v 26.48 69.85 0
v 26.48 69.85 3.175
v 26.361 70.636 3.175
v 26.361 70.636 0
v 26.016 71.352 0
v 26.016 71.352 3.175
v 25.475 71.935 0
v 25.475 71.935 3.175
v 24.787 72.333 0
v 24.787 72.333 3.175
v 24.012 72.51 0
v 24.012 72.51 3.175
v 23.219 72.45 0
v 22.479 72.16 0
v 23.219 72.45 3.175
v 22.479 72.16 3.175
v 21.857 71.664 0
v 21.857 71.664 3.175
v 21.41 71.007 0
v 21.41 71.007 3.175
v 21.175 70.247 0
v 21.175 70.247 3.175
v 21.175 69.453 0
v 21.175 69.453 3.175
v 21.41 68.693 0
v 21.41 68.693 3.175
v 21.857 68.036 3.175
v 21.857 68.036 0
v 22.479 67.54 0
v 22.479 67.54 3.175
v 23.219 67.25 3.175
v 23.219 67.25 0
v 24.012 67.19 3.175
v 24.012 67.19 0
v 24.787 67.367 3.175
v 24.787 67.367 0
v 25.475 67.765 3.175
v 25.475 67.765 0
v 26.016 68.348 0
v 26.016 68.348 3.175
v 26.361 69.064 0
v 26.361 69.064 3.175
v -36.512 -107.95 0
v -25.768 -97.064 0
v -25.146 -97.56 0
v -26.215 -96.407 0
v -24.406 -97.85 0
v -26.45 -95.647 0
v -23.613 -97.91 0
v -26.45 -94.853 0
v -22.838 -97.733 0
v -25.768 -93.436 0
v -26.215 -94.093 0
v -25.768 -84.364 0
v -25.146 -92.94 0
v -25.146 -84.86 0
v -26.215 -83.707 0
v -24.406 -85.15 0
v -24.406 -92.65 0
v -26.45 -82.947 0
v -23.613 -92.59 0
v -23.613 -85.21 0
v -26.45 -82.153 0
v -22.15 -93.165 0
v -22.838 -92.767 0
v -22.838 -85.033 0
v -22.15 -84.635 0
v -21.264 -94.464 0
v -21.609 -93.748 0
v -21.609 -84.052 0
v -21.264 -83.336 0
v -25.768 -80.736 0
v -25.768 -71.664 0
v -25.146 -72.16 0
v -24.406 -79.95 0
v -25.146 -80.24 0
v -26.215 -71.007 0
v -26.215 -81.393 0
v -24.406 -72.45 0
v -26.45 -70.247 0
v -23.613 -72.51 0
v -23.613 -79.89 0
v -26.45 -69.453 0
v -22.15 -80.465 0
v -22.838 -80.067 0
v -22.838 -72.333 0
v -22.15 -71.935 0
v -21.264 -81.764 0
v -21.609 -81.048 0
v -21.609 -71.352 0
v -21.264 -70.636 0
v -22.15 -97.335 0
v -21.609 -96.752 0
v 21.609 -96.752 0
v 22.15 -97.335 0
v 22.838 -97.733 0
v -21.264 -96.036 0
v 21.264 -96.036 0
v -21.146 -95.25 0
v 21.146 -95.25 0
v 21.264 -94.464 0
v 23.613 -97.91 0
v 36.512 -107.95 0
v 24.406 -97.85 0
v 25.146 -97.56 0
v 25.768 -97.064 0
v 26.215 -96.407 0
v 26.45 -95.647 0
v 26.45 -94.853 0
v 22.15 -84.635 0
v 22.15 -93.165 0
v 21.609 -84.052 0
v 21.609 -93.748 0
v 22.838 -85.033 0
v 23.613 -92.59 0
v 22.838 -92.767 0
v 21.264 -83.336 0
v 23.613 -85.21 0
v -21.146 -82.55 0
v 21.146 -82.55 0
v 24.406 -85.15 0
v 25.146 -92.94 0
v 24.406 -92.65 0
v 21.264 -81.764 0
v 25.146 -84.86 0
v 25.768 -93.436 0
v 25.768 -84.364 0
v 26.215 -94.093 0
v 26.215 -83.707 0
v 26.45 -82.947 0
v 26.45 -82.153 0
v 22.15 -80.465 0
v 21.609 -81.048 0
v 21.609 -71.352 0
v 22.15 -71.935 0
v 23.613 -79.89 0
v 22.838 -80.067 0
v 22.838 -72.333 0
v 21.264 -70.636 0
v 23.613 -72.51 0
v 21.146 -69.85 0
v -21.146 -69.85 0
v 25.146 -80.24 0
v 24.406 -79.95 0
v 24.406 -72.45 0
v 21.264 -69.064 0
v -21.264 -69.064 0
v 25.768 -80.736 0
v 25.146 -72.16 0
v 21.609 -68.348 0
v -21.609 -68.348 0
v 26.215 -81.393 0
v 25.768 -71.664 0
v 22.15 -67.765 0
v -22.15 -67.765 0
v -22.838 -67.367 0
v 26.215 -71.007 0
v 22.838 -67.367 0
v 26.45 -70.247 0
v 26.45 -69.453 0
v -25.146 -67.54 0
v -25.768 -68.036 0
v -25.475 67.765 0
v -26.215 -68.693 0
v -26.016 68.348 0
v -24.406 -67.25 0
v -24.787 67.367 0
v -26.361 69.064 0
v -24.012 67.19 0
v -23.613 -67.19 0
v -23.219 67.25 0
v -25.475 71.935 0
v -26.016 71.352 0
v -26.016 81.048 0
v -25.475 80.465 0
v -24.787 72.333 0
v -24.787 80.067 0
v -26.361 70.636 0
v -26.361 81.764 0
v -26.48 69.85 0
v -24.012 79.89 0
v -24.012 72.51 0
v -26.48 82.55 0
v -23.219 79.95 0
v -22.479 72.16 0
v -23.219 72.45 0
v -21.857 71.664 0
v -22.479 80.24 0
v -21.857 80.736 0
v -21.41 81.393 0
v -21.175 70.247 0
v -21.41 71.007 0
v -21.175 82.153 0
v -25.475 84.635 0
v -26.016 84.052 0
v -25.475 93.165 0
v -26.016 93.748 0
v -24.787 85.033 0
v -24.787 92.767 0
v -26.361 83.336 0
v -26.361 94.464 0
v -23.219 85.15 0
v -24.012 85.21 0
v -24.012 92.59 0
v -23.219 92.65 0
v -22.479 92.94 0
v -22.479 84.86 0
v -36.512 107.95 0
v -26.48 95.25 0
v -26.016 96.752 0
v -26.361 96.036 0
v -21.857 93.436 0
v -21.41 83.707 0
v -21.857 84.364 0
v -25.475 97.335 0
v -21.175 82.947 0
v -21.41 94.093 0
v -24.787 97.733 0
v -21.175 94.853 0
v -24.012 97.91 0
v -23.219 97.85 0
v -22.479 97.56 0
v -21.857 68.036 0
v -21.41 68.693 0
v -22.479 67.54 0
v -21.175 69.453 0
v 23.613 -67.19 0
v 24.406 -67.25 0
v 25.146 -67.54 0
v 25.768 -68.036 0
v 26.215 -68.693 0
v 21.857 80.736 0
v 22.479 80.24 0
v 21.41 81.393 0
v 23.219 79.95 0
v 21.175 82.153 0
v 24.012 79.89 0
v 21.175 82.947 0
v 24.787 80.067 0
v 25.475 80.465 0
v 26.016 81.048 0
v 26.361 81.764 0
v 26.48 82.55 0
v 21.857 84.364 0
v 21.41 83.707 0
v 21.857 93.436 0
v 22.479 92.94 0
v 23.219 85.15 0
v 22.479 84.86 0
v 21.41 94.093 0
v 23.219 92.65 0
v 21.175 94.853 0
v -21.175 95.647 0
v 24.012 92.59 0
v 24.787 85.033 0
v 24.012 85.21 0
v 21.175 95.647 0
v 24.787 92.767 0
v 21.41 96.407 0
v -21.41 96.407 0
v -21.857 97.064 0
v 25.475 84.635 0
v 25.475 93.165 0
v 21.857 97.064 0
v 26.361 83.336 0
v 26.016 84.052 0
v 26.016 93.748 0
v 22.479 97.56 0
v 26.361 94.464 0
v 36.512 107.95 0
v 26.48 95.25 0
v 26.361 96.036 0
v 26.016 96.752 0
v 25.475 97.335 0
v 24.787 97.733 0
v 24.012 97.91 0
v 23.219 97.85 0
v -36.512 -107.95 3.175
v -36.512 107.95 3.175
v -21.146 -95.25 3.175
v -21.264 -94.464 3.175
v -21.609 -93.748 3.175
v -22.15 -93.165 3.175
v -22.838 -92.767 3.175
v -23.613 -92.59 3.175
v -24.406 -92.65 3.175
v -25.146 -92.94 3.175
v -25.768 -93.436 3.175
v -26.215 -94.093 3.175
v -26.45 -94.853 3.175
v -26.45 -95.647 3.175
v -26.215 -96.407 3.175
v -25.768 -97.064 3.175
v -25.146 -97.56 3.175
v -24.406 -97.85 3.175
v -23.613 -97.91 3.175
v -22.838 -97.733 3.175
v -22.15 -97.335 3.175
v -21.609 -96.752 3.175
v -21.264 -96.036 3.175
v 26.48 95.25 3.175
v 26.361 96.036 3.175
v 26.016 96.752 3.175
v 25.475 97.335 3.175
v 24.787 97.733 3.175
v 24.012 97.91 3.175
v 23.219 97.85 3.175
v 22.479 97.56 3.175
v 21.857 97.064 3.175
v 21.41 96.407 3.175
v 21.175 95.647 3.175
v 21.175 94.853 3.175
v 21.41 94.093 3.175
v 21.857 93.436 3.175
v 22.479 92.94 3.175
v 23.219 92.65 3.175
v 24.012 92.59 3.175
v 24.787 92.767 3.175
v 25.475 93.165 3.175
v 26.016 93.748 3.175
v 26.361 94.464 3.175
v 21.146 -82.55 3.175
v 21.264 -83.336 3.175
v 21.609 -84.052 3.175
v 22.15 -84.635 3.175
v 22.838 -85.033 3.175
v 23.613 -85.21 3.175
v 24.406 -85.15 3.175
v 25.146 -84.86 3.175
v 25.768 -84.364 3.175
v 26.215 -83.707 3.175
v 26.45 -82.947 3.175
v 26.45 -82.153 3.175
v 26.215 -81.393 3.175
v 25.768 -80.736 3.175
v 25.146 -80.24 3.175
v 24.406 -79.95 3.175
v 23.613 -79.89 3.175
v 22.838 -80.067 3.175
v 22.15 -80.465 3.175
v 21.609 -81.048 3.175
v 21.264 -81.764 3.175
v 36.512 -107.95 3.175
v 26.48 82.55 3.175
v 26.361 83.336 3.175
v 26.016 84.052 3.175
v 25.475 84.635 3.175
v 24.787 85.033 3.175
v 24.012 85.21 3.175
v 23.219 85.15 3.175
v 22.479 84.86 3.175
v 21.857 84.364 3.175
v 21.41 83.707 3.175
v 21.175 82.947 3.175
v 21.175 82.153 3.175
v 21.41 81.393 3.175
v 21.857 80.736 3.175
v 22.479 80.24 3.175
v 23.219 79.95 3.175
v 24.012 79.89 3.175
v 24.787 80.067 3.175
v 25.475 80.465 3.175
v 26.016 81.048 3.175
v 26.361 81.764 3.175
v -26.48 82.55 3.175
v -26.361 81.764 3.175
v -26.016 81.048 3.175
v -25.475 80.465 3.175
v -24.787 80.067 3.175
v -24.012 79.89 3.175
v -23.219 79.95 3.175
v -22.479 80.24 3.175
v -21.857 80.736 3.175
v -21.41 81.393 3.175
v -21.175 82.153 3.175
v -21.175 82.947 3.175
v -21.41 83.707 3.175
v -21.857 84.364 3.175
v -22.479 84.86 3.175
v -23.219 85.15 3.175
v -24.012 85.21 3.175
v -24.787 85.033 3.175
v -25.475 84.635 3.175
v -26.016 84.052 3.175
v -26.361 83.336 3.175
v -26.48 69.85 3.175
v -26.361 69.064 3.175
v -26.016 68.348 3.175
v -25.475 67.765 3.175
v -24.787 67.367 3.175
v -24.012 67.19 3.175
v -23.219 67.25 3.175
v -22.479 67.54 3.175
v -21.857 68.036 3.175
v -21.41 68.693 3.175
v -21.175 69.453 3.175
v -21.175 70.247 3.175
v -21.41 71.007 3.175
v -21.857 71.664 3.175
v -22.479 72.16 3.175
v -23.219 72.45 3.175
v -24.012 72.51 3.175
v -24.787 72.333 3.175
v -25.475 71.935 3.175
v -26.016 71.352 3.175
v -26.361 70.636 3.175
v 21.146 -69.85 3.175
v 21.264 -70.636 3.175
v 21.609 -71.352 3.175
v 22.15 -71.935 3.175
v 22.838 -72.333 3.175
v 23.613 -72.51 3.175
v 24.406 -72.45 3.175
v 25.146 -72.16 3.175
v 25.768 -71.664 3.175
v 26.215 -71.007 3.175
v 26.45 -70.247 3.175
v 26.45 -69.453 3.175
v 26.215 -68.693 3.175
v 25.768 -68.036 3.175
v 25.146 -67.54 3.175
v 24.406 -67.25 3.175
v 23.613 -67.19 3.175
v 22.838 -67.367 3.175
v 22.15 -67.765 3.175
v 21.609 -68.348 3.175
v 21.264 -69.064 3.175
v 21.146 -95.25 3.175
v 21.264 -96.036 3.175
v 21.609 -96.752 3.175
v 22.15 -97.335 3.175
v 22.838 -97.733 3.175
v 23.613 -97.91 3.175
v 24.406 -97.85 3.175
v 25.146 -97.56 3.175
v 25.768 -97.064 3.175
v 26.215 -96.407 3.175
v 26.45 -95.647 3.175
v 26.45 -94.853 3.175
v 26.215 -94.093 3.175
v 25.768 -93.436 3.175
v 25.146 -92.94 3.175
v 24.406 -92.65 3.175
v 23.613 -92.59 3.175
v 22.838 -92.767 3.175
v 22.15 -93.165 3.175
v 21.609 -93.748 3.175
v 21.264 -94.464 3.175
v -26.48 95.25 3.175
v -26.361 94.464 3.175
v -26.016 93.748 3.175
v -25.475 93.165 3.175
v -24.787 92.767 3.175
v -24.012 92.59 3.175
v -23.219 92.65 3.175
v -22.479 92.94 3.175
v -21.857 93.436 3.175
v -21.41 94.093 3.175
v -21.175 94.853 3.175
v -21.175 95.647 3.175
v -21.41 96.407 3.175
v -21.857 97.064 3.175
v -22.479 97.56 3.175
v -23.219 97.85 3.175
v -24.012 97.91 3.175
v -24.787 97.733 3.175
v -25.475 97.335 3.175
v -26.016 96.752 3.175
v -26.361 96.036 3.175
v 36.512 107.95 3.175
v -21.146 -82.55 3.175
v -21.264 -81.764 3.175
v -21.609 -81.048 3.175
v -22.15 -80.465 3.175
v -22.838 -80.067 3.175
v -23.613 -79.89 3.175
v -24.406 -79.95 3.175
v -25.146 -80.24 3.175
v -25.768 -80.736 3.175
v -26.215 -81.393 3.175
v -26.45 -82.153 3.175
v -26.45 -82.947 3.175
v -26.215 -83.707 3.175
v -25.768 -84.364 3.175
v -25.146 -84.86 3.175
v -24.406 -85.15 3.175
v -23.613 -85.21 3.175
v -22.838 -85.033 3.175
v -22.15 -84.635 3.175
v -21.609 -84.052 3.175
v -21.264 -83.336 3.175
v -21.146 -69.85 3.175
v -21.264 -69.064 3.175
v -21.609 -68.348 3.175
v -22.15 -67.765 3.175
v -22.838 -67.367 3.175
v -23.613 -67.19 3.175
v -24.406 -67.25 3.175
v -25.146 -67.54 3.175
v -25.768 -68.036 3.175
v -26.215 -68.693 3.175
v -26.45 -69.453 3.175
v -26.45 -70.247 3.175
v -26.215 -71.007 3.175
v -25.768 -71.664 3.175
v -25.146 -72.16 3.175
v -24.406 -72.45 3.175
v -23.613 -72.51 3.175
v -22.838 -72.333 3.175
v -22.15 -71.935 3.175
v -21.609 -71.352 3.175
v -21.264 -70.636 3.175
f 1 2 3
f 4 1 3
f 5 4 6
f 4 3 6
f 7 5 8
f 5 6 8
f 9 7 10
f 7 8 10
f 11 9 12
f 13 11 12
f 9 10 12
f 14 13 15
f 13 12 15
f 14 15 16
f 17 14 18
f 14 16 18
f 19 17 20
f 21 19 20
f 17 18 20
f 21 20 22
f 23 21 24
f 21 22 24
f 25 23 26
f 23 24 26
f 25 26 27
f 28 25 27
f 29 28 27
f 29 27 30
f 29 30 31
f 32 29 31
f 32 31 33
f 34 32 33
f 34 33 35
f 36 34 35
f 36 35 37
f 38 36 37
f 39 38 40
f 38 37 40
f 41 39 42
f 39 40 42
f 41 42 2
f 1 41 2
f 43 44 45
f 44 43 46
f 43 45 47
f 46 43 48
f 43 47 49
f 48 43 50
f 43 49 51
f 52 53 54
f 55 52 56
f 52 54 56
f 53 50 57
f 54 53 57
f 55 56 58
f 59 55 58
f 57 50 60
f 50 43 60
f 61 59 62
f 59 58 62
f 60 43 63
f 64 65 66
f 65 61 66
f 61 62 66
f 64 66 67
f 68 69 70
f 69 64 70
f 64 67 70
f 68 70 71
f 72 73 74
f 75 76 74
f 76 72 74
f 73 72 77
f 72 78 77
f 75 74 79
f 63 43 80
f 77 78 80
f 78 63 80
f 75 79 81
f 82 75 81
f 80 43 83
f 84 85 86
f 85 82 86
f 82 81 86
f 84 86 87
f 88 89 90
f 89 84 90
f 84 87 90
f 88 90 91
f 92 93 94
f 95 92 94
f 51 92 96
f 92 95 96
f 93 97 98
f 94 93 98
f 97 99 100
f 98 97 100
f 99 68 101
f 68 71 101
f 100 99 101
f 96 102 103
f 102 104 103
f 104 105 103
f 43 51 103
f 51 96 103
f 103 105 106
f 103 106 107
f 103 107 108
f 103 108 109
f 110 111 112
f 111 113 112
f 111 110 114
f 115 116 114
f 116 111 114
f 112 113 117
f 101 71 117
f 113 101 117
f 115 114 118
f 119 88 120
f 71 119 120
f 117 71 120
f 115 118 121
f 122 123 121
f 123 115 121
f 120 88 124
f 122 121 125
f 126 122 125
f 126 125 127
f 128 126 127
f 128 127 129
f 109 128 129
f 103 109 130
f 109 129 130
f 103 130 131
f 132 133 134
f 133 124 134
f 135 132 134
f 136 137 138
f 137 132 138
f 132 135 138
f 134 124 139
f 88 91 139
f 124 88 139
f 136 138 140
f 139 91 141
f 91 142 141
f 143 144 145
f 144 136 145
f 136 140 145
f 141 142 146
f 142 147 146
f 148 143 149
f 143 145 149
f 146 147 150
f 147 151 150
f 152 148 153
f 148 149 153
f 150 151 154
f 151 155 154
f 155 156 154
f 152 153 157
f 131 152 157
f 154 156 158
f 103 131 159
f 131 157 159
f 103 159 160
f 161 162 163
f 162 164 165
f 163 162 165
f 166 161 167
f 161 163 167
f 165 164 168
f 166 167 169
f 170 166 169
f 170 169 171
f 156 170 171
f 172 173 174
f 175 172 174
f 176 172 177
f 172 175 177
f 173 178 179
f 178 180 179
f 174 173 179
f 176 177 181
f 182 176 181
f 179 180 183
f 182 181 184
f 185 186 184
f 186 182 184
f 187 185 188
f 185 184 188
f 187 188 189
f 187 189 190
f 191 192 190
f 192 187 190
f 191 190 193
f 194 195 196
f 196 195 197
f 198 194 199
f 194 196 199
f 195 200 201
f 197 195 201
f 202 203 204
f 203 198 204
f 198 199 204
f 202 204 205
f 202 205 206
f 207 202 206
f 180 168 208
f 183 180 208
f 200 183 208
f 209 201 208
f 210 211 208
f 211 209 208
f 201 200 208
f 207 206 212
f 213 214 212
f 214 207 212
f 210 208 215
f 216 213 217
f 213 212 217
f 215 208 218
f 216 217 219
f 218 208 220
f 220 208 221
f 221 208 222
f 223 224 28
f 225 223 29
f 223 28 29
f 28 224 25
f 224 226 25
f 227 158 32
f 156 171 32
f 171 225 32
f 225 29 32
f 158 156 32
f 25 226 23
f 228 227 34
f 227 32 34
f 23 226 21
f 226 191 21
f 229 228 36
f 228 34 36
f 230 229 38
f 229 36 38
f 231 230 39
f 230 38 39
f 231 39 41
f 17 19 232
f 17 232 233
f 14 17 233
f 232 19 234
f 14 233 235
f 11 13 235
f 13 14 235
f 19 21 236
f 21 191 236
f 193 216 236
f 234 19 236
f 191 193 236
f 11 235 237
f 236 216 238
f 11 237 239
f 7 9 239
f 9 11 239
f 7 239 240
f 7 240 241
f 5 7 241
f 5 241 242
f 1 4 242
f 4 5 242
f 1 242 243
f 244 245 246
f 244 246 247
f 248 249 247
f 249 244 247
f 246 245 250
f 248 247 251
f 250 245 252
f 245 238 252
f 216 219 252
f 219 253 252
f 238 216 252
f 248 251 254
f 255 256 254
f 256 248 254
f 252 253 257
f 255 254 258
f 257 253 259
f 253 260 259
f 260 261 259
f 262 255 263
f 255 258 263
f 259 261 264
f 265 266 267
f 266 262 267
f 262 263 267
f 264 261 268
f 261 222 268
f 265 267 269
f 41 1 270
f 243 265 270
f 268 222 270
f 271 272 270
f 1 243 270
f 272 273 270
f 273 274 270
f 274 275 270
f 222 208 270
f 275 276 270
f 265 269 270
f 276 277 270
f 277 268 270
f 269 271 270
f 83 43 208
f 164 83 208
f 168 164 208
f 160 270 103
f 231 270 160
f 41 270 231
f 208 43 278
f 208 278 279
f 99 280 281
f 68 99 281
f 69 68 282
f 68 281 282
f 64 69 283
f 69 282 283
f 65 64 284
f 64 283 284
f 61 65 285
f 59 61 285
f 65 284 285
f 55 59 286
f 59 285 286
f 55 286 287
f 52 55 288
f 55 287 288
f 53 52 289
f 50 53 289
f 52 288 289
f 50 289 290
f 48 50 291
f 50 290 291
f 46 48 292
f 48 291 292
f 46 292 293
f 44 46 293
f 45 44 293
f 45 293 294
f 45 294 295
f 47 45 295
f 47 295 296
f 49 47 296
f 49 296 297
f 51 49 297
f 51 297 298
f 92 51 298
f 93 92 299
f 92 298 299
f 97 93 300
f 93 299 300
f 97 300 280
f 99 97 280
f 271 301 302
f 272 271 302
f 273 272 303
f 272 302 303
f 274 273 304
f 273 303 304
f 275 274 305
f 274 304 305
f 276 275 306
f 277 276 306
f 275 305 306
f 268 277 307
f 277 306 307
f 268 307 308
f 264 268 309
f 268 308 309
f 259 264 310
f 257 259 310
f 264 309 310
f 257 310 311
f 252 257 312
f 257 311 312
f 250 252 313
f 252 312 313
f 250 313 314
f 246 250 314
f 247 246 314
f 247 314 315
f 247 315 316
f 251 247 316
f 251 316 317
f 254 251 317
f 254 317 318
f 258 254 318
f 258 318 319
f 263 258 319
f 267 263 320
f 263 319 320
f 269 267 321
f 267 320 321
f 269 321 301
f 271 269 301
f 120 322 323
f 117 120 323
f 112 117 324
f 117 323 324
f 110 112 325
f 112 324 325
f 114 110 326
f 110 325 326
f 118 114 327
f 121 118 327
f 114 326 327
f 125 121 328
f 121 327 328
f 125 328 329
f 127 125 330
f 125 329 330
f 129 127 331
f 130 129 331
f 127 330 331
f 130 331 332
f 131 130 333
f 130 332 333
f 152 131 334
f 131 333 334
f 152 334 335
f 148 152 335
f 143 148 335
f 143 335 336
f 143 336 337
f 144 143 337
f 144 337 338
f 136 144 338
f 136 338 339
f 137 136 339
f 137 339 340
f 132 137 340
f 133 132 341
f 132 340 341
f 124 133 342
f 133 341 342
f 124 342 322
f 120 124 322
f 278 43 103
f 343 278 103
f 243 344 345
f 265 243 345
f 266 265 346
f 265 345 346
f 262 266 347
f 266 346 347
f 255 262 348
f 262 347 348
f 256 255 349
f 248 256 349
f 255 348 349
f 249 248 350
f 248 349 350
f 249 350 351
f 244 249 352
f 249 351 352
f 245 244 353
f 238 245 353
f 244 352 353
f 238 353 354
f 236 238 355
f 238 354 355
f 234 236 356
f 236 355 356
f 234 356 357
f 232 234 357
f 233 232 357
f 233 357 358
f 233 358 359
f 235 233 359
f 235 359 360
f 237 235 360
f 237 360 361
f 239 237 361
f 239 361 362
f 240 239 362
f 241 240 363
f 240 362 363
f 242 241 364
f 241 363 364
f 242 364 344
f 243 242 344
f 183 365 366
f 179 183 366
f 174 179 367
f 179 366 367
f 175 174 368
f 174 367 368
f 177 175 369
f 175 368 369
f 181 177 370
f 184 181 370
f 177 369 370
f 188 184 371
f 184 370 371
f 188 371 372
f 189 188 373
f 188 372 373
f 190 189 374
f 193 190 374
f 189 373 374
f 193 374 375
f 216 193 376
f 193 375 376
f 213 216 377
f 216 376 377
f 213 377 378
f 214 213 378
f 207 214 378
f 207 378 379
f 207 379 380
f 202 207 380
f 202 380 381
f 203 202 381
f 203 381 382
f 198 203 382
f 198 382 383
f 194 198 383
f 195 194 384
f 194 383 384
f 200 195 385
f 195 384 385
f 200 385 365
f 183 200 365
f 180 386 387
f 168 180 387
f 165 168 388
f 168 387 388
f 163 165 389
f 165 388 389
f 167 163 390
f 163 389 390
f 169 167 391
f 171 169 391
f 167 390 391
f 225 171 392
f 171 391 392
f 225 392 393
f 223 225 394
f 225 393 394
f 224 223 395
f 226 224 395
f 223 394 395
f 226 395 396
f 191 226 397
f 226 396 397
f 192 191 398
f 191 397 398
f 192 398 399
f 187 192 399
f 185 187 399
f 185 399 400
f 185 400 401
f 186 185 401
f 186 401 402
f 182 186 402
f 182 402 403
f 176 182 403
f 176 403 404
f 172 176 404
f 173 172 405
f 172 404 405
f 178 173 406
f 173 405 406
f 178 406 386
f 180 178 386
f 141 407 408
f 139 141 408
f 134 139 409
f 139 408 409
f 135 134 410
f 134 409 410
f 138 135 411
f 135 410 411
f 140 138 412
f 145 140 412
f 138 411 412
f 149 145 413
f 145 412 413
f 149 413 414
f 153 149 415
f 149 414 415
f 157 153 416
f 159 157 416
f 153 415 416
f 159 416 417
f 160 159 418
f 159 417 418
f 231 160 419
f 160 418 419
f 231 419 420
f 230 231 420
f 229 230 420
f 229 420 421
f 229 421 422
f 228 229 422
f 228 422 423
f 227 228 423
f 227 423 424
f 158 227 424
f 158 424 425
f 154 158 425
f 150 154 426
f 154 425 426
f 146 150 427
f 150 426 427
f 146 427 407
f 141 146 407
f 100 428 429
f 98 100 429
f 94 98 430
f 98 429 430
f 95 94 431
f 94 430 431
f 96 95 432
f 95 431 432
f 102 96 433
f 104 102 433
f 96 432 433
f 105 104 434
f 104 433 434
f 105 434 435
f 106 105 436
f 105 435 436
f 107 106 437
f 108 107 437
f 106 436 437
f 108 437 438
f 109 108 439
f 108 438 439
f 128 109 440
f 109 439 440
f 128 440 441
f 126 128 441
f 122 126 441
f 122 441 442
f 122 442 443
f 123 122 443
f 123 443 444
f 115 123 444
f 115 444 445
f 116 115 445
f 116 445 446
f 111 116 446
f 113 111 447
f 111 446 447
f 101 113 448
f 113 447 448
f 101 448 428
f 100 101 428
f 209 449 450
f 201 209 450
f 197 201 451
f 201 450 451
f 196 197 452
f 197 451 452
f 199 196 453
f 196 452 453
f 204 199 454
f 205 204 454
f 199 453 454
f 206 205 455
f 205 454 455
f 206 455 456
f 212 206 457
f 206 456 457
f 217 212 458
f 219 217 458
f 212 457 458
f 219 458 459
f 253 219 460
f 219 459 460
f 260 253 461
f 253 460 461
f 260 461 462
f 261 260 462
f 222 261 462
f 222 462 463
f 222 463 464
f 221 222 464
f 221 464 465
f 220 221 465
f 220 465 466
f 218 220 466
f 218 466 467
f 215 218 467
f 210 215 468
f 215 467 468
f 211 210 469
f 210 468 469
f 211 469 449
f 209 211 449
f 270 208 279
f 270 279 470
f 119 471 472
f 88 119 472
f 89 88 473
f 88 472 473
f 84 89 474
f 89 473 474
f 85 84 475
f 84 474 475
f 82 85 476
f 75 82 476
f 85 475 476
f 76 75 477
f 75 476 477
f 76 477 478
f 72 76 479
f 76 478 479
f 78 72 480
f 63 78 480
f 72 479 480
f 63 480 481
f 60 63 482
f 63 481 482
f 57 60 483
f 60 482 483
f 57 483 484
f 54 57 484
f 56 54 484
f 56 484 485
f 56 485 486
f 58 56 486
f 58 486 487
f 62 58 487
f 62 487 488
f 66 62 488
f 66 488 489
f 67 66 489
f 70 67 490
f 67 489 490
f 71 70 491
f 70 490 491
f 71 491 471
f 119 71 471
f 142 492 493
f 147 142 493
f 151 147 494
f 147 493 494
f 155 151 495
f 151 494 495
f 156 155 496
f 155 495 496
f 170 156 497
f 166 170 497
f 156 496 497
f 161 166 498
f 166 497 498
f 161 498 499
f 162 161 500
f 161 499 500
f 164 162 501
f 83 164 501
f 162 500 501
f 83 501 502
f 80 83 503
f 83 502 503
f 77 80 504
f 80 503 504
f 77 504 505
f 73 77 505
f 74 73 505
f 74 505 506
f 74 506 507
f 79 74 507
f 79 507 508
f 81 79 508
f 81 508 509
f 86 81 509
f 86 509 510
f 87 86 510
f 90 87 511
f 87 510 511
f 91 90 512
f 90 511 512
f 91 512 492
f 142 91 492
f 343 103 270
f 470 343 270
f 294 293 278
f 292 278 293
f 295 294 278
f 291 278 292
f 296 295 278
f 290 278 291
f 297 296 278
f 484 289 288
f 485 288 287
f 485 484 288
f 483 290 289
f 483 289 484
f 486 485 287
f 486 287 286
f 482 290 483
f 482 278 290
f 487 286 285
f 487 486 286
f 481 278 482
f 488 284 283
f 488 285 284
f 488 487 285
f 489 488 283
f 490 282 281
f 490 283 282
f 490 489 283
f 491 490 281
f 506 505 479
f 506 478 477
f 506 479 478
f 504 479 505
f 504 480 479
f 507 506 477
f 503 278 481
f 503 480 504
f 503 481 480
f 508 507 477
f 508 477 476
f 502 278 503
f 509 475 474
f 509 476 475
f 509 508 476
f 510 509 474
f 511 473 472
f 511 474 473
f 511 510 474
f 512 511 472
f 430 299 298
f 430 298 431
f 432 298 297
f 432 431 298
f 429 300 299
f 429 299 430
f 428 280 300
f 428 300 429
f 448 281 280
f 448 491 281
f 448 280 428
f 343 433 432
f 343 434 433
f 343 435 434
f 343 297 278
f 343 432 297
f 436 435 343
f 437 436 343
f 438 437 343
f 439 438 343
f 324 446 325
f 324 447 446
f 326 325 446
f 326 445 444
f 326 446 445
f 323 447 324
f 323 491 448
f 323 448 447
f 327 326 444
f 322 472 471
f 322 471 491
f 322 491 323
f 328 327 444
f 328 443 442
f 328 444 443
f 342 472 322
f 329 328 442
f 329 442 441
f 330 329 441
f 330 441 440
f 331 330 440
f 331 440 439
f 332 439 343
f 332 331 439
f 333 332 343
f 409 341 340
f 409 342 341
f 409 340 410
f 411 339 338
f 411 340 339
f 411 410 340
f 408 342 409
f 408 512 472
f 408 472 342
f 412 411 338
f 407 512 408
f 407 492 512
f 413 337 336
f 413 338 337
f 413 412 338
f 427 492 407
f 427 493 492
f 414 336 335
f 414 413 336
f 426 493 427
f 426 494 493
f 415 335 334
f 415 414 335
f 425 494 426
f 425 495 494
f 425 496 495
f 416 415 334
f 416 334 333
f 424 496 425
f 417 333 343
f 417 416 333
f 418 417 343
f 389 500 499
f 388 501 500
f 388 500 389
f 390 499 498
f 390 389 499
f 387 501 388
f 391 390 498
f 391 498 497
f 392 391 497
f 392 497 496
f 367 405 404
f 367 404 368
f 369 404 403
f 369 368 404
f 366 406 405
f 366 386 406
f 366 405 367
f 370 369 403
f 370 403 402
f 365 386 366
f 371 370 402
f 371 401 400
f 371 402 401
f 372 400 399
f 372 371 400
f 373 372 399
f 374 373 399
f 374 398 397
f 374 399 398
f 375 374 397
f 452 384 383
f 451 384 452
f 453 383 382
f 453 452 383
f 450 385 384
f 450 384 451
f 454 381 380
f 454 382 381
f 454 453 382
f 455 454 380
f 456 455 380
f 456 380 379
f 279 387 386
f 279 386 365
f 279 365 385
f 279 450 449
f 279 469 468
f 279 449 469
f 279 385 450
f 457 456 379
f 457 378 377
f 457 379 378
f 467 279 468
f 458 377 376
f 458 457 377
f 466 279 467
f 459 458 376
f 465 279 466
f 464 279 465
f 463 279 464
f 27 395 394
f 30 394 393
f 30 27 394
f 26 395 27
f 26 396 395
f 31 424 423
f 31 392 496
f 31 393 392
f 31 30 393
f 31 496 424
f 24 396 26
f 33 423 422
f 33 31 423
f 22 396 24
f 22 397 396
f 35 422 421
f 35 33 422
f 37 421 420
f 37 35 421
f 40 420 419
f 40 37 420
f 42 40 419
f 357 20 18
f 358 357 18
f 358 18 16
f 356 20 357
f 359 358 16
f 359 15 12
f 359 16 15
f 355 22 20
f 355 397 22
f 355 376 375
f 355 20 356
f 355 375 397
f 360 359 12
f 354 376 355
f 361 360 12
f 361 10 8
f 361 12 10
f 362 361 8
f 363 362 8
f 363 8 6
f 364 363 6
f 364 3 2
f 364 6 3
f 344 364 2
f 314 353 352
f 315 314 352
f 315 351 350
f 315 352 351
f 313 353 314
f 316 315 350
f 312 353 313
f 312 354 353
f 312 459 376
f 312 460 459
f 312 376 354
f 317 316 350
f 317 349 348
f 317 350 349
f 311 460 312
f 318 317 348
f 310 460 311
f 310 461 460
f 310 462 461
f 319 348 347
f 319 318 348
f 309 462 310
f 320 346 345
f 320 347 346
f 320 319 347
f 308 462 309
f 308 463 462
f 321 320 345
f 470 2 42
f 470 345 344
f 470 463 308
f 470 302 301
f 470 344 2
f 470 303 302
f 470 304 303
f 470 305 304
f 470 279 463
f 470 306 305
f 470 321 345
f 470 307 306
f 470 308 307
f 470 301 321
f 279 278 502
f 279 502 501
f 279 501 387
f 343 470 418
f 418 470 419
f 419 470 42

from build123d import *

# Parameters (mm, degrees)
SKETCH1_W           = 73.025
SKETCH1_H           = 215.9
BOSS_EXTRUDE1_DEPTH = 3.175
SKETCH2_R           = 2.667
CUT_EXTRUDE1_DEPTH  = 3.175


with BuildPart() as part:
    # Sketch1 → Boss-Extrude1 (new body)
    with BuildSketch(Plane.XY):
        Rectangle(SKETCH1_W, SKETCH1_H)
    extrude(amount=BOSS_EXTRUDE1_DEPTH)

    # Sketch2 → Cut-Extrude1 (cut)
    with BuildSketch(Plane.XY.offset(3.175)):
        with Locations((-23.8125, -69.85)):
            Circle(SKETCH2_R)
        with Locations((-23.8125, -82.55)):
            Circle(SKETCH2_R)
        with Locations((-23.8125, -95.25)):
            Circle(SKETCH2_R)
        with Locations(Location((-23.8125, 95.25, 0), (0, 0, 180))):
            Circle(SKETCH2_R)
        with Locations(Location((-23.8125, 82.55, 0), (0, 0, 180))):
            Circle(SKETCH2_R)
        with Locations(Location((-23.8125, 69.85, 0), (0, 0, 180))):
            Circle(SKETCH2_R)
        with Locations((23.8125, 95.25)):
            Circle(SKETCH2_R)
        with Locations((23.8125, 82.55)):
            Circle(SKETCH2_R)
        with Locations((23.8125, 69.85)):
            Circle(SKETCH2_R)
        with Locations(Location((23.8125, -95.25, 0), (0, 0, 180))):
            Circle(SKETCH2_R)
        with Locations(Location((23.8125, -82.55, 0), (0, 0, 180))):
            Circle(SKETCH2_R)
        with Locations(Location((23.8125, -69.85, 0), (0, 0, 180))):
            Circle(SKETCH2_R)
    extrude(amount=-CUT_EXTRUDE1_DEPTH, mode=Mode.SUBTRACT)


solid = part.part
